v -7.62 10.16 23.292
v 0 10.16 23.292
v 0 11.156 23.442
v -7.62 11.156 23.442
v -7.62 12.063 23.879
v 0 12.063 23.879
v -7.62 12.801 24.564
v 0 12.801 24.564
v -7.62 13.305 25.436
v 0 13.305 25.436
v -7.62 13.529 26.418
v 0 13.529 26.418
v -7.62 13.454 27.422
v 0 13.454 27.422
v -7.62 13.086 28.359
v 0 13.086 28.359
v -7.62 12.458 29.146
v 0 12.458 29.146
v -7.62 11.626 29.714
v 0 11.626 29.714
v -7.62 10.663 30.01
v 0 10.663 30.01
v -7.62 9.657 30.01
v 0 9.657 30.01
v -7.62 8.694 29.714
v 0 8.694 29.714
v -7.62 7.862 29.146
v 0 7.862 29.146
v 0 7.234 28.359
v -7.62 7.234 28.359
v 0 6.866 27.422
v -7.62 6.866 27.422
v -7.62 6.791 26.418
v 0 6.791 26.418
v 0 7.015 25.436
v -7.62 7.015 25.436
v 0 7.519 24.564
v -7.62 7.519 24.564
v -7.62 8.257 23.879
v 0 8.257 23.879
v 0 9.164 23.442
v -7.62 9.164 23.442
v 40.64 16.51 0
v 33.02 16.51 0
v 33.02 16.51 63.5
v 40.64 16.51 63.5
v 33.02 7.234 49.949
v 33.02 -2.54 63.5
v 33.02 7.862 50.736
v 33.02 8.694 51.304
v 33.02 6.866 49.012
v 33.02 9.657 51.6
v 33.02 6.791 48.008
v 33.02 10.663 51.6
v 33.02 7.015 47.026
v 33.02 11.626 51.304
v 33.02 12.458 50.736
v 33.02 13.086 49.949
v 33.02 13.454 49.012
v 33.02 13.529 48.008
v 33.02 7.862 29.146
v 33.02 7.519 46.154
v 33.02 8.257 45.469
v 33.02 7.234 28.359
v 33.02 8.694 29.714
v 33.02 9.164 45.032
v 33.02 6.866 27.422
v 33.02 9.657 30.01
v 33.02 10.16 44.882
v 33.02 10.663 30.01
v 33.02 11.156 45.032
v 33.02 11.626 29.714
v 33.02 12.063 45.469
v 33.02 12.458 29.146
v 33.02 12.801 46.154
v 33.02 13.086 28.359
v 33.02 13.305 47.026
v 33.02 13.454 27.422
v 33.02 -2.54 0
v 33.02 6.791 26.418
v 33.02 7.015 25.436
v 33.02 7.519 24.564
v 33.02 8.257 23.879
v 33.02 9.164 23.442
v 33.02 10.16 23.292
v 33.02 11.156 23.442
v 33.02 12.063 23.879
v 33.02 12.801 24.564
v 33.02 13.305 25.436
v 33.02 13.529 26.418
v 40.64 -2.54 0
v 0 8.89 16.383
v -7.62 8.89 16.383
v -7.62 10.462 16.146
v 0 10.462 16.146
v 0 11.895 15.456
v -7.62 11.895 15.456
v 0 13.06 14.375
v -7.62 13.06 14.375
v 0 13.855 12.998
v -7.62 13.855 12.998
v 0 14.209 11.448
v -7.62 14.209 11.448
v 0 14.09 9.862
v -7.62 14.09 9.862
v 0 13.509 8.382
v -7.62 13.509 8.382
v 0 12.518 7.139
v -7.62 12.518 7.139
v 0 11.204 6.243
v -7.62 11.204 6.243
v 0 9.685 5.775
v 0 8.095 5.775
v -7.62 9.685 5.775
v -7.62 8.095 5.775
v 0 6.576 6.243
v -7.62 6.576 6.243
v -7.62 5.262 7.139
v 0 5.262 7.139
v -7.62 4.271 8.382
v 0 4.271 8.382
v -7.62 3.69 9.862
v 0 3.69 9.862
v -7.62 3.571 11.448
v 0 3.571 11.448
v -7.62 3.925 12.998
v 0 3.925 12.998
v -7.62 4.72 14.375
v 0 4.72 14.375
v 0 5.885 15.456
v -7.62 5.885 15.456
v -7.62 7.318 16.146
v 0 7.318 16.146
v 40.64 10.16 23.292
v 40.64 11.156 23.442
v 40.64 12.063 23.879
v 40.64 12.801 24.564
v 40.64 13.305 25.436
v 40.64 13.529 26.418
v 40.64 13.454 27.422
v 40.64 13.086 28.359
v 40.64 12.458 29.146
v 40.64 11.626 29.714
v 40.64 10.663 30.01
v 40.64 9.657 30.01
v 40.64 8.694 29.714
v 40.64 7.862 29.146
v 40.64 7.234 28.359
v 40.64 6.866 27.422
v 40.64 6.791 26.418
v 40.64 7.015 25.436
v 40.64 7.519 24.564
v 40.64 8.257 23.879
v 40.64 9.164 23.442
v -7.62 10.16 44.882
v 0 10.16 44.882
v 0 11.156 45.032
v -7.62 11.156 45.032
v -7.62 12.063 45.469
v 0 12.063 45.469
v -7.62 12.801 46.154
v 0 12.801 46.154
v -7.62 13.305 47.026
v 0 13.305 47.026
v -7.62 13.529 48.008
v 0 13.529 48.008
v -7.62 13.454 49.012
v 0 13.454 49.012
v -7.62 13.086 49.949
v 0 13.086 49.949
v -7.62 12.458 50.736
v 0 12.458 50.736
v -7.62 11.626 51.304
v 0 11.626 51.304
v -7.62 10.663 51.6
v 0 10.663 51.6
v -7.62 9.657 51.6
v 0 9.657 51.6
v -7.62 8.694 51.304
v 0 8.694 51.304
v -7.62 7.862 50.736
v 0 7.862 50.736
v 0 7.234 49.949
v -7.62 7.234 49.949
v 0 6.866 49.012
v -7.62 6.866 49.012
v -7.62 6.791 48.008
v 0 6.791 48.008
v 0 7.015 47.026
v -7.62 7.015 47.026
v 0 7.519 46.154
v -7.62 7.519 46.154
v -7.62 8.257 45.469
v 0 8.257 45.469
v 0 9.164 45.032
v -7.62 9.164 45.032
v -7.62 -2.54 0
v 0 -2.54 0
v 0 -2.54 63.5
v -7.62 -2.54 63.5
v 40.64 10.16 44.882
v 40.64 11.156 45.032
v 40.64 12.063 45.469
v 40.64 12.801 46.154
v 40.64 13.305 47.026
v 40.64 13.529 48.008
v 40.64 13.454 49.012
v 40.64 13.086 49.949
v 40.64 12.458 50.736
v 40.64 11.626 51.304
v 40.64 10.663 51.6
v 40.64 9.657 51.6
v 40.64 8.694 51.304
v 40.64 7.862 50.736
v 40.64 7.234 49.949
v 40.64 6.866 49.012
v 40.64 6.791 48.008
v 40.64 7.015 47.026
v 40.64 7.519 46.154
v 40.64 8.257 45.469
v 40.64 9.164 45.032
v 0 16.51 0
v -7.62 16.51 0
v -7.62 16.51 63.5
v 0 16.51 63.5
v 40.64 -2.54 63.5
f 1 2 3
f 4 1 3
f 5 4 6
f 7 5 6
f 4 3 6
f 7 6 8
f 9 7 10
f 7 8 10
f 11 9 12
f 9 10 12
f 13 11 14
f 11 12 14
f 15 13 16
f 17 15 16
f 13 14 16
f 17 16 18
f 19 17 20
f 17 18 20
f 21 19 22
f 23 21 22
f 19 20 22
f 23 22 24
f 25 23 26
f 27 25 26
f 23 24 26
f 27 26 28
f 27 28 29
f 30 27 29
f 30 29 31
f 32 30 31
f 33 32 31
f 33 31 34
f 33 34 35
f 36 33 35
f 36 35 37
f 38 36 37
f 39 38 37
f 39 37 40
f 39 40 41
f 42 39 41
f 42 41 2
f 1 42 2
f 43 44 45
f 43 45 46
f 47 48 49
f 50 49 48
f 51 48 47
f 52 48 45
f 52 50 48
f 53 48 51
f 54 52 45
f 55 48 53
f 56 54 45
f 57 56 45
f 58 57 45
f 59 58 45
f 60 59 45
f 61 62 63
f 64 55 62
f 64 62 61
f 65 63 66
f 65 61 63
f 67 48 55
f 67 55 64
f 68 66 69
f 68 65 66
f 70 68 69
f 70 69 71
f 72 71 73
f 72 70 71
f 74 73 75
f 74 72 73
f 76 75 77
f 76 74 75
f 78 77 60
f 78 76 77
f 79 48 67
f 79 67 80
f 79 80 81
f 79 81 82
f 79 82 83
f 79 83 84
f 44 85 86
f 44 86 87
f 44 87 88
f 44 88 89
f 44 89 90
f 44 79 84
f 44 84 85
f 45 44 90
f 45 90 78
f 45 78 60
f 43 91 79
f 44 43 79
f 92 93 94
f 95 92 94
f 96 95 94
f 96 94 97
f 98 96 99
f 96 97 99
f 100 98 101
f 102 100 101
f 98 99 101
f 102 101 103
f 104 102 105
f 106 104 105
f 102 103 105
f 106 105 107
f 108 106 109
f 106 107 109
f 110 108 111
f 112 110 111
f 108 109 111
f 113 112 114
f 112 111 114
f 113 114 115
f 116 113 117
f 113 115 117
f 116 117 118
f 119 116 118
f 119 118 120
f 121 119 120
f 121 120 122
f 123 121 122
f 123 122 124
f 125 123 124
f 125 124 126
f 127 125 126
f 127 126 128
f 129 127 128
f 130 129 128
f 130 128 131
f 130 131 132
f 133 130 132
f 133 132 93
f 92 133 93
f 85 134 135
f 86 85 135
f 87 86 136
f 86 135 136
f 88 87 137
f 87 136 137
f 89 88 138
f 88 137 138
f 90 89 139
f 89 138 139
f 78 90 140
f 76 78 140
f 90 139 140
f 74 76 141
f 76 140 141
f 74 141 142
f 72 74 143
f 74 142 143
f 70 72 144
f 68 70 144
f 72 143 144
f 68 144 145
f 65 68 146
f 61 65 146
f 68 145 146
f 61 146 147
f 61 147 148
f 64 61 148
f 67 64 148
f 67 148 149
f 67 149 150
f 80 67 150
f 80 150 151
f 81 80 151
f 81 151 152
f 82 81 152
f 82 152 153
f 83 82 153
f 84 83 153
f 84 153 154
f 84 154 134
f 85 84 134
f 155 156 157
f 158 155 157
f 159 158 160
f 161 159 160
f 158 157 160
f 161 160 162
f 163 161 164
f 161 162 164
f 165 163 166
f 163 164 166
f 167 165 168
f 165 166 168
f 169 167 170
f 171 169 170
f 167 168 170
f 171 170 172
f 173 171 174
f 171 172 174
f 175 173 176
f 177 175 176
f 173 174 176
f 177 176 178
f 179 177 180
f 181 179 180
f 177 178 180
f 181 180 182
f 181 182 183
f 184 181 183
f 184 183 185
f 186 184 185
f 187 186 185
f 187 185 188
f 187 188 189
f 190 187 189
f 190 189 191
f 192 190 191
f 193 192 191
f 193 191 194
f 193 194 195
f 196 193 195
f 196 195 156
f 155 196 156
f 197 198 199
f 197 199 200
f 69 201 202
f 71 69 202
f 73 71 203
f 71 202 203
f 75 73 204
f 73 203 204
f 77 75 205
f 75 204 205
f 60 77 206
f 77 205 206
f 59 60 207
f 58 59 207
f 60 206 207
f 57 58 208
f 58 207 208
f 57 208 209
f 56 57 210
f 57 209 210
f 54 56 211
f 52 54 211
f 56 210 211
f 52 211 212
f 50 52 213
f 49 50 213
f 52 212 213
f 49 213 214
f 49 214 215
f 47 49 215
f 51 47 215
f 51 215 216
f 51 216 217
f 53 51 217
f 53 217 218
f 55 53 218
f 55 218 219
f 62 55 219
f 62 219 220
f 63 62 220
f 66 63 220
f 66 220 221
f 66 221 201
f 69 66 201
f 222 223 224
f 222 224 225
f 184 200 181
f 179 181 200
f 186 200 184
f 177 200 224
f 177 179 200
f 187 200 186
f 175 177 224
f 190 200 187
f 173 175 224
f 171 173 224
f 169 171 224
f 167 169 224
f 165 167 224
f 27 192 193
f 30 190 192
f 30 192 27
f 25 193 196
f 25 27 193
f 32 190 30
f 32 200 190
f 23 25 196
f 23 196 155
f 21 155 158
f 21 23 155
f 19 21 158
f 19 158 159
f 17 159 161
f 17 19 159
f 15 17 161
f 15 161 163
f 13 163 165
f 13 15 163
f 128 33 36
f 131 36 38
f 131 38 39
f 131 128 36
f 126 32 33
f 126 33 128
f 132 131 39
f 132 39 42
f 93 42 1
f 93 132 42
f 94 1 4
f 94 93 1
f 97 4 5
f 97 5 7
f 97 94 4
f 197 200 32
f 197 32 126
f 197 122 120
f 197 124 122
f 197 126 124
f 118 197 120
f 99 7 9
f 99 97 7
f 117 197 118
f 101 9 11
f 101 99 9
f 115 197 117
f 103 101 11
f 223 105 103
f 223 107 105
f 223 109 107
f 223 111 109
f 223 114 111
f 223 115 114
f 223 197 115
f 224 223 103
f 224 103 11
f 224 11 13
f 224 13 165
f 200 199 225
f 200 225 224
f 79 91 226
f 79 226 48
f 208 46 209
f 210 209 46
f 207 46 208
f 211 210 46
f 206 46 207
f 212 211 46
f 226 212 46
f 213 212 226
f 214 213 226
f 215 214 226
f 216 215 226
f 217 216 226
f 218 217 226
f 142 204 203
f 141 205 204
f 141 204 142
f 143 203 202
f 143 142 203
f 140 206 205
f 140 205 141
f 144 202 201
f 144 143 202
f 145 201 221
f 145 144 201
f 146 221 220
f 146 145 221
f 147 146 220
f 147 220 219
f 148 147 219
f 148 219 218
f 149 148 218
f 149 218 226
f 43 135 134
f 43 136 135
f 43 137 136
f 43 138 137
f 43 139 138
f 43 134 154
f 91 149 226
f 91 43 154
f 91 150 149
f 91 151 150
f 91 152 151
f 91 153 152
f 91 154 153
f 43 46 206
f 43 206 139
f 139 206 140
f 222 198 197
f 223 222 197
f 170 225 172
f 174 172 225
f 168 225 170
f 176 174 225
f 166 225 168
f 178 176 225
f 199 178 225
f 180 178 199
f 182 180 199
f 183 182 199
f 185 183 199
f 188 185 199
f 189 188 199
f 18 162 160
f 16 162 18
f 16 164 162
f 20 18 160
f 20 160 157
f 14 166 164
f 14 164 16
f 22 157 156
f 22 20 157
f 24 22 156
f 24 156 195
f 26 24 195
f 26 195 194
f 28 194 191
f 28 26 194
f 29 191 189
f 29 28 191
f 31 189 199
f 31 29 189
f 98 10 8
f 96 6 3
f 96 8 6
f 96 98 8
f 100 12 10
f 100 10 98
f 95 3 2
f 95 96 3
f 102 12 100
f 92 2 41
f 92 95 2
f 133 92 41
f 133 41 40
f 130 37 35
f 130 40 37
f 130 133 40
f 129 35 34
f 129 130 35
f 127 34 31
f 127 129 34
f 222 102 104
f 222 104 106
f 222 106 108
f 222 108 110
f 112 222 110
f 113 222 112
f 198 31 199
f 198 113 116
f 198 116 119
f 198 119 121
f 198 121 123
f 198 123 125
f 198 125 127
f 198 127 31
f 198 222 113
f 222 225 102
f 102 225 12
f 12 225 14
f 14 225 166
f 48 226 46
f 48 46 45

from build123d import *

# Parameters (mm, degrees)
BOSS_EXTRUDE1_DEPTH            = 63.5
CUT_EXTRUDE1_REACH             = 50.26
SKETCH2_R                      = 5.334
SKETCH3_R                      = 3.3782
CUT_EXTRUDE2_DEPTH             = 49.26
CUT_EXTRUDE4_REACH             = 65.5
SKETCH5_W                      = 33.02
SKETCH5_H                      = 2.54
CUT_EXTRUDE4_DIRECTION_2_DEPTH = 1
SKETCH6_R                      = 3.3782
CUT_EXTRUDE5_DEPTH             = 49.26


with BuildPart() as part:
    # Sketch1 → Boss-Extrude1 (new body)
    with BuildSketch(Plane.XY):
        Polygon((-7.62, 16.51), (0, 16.51), (0, 0), (33.02, 0), (33.02, 16.51), (40.64, 16.51), (40.64, -2.54), (-7.62, -2.54), align=None)
    extrude(amount=BOSS_EXTRUDE1_DEPTH)

    # Sketch2 → Cut-Extrude1 (cut, up to next)
    with BuildSketch(Plane.ZY.offset(7.62), mode=Mode.PRIVATE) as cut_extrude1_sk1:
        with Locations((11.049, 8.89)):
            Circle(SKETCH2_R)
    cut_extrude1_tool1 = extrude(cut_extrude1_sk1.sketch, amount=-CUT_EXTRUDE1_REACH, mode=Mode.PRIVATE) & part.part
    add(cut_extrude1_tool1.solids().sort_by_distance((-7.62, 8.89, 11.049))[0], mode=Mode.SUBTRACT)

    # Sketch3 → Cut-Extrude2 (cut, through all)
    with BuildSketch(Plane(origin=(40.64, 0, 0), x_dir=(0, 0, -1), z_dir=(1, 0, 0))):
        with Locations((-48.26, 10.16)):
            Circle(SKETCH3_R)
    extrude(amount=-CUT_EXTRUDE2_DEPTH, mode=Mode.SUBTRACT)

    # Sketch5 → Cut-Extrude4 (cut, up to next)
    with BuildSketch(Plane.XY.offset(63.5), mode=Mode.PRIVATE) as cut_extrude4_sk1:
        with Locations((16.51, -1.27)):
            Rectangle(SKETCH5_W, SKETCH5_H)
    cut_extrude4_tool1 = extrude(cut_extrude4_sk1.sketch, amount=-CUT_EXTRUDE4_REACH, mode=Mode.PRIVATE) & part.part
    add(cut_extrude4_tool1.solids().sort_by_distance((16.51, -1.27, 63.5))[0], mode=Mode.SUBTRACT)

    # Sketch5 → Cut-Extrude4 direction 2 (cut)
    with BuildSketch(Plane.XY.offset(63.5)):
        with Locations((16.51, -1.27)):
            Rectangle(SKETCH5_W, SKETCH5_H)
    extrude(amount=CUT_EXTRUDE4_DIRECTION_2_DEPTH, mode=Mode.SUBTRACT)

    # Sketch6 → Cut-Extrude5 (cut, through all)
    with BuildSketch(Plane(origin=(40.64, 0, 0), x_dir=(0, 0, -1), z_dir=(1, 0, 0))):
        with Locations((-26.67, 10.16)):
            Circle(SKETCH6_R)
    extrude(amount=-CUT_EXTRUDE5_DEPTH, mode=Mode.SUBTRACT)


solid = part.part
